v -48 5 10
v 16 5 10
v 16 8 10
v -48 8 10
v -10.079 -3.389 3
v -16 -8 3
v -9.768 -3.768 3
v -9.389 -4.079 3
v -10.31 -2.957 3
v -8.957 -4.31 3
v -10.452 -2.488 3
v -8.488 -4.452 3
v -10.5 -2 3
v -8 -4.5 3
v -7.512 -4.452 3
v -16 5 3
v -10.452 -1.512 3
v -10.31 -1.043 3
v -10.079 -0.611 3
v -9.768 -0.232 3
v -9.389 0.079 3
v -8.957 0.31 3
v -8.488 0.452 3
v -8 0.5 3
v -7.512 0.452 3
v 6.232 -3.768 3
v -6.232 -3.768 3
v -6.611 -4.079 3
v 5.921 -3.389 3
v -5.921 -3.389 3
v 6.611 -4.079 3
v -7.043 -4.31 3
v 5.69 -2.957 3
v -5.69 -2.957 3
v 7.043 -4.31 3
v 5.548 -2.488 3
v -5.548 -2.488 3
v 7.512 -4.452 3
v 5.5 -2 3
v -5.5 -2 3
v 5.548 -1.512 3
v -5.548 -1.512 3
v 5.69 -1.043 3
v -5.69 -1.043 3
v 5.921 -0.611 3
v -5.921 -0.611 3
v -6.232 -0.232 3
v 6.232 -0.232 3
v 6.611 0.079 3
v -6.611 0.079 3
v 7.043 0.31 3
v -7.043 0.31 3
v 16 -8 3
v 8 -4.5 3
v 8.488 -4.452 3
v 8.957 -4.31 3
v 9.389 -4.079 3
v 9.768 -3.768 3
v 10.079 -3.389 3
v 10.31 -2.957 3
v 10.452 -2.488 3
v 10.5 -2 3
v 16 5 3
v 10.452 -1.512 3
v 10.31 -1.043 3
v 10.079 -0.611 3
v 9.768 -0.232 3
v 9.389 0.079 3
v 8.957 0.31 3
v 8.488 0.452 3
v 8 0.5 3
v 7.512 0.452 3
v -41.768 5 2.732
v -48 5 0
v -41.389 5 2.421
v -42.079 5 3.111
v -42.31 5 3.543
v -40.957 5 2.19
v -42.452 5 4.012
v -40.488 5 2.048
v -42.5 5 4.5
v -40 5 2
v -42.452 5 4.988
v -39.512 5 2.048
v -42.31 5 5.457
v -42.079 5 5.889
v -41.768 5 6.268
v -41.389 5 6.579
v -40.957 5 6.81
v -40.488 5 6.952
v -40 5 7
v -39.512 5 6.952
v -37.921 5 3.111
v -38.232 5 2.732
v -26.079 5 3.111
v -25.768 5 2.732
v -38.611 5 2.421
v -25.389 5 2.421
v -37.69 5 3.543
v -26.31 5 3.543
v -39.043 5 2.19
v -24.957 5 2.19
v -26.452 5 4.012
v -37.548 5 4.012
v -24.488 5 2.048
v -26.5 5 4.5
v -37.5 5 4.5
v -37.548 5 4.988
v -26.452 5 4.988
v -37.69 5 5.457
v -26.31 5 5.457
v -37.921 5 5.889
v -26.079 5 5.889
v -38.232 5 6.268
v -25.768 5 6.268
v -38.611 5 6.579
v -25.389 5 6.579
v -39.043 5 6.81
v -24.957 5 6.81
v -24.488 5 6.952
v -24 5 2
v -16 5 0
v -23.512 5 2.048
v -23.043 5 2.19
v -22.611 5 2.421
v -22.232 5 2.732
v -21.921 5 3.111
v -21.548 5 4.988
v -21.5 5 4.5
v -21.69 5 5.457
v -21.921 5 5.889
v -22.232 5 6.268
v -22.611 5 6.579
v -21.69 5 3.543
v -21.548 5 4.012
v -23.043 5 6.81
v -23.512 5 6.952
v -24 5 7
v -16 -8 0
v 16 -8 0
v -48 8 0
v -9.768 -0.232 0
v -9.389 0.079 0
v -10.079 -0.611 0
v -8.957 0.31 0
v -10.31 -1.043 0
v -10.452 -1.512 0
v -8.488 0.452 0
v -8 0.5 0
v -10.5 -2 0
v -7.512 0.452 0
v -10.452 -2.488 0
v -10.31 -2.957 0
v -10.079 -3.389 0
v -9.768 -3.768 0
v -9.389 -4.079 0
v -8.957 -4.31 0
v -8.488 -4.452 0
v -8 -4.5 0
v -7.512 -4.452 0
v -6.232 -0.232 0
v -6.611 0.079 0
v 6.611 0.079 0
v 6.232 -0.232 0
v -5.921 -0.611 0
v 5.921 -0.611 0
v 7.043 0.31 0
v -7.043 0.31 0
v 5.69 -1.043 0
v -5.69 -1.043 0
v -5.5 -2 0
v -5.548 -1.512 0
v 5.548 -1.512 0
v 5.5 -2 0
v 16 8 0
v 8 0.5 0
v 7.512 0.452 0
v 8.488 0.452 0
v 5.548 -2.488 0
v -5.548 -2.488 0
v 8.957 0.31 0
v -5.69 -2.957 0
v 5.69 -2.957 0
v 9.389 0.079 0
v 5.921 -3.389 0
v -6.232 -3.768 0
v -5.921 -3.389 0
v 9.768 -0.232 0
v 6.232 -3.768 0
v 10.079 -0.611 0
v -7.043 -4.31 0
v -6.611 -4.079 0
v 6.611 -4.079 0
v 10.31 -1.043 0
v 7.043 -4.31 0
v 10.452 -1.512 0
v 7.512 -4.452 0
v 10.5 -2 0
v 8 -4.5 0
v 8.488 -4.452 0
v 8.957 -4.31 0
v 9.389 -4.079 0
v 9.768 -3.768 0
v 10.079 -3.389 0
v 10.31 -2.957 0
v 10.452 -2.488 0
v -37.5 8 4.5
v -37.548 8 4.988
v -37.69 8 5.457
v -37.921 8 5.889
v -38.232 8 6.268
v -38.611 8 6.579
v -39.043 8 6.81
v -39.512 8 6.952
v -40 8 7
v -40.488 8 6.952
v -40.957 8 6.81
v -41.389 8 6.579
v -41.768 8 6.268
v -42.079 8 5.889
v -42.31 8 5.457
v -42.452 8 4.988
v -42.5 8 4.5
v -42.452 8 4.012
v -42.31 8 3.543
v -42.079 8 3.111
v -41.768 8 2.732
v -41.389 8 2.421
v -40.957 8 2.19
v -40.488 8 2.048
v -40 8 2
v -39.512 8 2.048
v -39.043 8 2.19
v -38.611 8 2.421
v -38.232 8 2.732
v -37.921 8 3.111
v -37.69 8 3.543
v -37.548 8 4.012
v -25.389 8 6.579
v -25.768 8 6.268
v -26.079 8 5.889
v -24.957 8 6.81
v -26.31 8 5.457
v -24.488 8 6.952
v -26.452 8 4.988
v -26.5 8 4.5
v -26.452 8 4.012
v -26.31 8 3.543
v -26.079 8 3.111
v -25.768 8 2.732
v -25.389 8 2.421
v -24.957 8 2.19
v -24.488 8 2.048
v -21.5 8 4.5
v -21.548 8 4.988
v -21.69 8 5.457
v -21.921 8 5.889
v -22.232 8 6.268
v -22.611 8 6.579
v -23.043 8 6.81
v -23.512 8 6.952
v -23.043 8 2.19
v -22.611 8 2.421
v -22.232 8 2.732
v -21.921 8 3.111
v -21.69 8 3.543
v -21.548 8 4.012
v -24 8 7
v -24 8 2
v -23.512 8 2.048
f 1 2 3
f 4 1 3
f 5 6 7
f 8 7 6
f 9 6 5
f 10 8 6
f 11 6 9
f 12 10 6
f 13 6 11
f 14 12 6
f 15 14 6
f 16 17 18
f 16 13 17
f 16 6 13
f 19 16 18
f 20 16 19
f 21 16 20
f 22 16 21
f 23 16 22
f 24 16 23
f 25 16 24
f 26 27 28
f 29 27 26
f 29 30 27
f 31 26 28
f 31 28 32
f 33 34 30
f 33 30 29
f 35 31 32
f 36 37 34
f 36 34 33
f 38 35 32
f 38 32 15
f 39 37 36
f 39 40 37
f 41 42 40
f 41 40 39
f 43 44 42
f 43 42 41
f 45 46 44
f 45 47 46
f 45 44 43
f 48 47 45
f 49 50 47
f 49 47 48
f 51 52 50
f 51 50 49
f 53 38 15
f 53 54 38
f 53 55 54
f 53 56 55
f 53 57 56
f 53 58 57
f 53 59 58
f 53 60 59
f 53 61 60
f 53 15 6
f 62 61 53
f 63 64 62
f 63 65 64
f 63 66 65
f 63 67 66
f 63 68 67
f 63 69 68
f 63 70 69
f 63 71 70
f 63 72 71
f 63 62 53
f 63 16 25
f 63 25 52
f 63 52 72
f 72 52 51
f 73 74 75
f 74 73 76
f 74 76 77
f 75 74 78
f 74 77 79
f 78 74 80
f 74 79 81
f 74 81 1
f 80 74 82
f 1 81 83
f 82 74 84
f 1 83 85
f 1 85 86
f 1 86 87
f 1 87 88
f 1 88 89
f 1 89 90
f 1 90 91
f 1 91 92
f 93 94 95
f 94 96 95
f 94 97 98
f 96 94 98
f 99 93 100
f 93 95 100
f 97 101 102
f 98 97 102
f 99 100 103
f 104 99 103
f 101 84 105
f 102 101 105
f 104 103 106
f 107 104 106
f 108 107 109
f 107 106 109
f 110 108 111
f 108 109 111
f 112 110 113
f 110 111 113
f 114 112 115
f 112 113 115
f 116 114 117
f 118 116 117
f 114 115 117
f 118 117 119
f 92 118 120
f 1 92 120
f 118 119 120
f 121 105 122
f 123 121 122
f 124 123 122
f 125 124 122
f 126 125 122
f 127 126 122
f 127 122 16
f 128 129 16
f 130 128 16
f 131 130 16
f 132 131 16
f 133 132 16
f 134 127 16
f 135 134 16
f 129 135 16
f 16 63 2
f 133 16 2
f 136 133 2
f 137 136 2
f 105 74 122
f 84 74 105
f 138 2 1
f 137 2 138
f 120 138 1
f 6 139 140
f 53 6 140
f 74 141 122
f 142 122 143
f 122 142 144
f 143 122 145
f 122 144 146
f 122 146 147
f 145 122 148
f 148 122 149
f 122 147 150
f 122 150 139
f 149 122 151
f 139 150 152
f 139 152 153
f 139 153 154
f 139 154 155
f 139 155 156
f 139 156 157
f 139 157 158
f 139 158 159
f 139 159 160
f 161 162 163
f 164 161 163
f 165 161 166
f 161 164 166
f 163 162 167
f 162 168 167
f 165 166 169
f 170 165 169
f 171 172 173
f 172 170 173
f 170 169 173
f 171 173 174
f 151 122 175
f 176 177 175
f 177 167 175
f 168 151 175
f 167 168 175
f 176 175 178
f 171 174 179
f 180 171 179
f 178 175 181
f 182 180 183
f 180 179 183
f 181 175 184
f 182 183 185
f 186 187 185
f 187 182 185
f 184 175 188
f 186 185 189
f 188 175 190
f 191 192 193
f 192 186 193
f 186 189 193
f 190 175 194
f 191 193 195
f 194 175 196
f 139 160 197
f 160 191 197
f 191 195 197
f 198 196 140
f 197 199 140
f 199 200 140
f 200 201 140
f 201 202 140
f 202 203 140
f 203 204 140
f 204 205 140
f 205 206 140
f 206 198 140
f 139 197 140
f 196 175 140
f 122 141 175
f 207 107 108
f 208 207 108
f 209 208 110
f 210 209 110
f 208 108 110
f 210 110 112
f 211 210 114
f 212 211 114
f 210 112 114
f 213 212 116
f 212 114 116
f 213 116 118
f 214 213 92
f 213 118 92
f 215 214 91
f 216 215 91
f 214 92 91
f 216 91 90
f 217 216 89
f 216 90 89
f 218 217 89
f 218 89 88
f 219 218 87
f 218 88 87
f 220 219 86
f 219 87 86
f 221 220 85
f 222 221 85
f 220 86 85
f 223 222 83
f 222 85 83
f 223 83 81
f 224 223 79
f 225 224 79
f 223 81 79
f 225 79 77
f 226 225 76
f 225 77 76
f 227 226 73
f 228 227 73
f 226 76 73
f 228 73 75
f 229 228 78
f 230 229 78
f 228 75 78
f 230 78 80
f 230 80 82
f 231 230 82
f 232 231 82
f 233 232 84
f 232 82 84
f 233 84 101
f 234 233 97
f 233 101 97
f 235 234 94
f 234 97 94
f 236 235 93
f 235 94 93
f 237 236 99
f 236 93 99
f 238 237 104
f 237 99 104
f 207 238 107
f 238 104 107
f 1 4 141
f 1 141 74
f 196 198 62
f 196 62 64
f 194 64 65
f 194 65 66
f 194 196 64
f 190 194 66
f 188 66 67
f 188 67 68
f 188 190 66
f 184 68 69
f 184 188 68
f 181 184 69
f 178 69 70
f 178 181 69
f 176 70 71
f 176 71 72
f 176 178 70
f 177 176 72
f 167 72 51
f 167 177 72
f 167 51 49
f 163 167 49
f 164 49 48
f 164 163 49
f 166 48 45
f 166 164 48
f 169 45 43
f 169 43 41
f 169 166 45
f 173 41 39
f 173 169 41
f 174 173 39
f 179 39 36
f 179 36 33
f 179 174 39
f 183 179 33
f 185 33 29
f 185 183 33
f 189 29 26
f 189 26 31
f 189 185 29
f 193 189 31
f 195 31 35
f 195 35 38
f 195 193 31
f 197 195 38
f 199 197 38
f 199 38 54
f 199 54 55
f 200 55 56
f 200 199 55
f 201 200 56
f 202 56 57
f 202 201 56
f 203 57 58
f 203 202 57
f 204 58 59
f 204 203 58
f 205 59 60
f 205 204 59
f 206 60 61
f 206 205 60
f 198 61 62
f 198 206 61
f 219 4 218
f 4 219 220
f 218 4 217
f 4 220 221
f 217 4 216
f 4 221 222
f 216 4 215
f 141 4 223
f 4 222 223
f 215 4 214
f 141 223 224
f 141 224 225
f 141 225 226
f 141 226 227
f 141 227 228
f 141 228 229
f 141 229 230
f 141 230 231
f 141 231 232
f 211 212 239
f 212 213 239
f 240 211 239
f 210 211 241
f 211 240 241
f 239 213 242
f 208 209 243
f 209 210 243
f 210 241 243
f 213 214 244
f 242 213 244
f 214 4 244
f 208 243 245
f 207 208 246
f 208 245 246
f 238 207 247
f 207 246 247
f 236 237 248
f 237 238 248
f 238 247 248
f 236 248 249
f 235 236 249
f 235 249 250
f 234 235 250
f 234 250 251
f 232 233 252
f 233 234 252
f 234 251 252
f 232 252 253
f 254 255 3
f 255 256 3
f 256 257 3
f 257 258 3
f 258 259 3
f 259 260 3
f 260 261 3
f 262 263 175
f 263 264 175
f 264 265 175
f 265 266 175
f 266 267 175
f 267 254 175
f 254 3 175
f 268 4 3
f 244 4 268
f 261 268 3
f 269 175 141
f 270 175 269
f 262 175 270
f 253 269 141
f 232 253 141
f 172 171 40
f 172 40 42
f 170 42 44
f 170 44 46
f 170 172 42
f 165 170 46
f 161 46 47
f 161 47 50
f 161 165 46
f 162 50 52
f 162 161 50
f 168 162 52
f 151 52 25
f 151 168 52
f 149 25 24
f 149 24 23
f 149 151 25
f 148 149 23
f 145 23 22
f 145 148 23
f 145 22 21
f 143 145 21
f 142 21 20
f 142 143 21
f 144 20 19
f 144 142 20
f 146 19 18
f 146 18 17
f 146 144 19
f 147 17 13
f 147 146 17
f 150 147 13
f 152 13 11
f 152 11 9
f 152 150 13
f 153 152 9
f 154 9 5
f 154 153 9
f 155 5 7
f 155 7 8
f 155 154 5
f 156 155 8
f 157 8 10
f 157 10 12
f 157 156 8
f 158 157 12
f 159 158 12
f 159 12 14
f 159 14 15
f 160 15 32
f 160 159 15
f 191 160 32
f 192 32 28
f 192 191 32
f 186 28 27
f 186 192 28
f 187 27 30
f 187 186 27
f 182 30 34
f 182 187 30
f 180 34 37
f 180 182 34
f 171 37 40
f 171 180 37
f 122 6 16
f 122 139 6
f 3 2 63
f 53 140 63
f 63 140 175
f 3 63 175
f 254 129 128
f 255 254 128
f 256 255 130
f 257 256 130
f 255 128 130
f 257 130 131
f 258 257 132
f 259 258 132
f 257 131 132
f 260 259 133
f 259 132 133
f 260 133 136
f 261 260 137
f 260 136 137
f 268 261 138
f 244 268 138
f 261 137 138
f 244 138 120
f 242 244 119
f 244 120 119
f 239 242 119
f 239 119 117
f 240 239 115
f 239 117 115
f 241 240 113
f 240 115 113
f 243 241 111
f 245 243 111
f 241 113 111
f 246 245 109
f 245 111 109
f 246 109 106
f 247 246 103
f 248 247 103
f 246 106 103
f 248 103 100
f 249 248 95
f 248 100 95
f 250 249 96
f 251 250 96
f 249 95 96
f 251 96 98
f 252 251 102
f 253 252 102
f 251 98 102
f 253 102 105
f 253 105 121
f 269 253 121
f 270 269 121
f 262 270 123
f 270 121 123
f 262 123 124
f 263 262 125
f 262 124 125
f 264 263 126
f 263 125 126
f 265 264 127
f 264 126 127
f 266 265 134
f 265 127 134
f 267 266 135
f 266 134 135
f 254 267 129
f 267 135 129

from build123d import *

# Parameters (mm, degrees)
F0_W     = 32
F0_H     = 16
F0_R     = 2.5
F1_DEPTH = 3
F2_W     = 32
F2_H     = 3
F3_DEPTH = 7
F5_DEPTH = 32
F6_R     = 2.5
F7_DEPTH = 3


with BuildPart() as f1:
    # F0 (on Top) → F1 (new body)
    with BuildSketch(Plane.XY):
        Rectangle(F0_W, F0_H)
        with Locations((-8, -2)):
            Circle(F0_R, mode=Mode.SUBTRACT)
        with Locations((8, -2)):
            Circle(F0_R, mode=Mode.SUBTRACT)
    extrude(amount=F1_DEPTH)

    # F2 (on face) → F3 (join)
    with BuildSketch(Plane.XY.offset(3)):
        with Locations((0, 6.5)):
            Rectangle(F2_W, F2_H)
    extrude(amount=F3_DEPTH)

    # F4 (on face) → F5 (join)
    with BuildSketch(Plane(origin=(-16, 0, 0), x_dir=(0, -1, 0), z_dir=(-1, 0, 0))):
        Polygon((-8, 10), (-8, 0), (-5, 0), (-5, 3), (-5, 10), align=None)
    extrude(amount=F5_DEPTH)

    # F6 (on face) → F7 (cut)
    with BuildSketch(Plane.XZ.offset(-5)):
        with Locations((-40, 4.5)):
            Circle(F6_R)
        with Locations((-24, 4.5)):
            Circle(F6_R)
    extrude(amount=-F7_DEPTH, mode=Mode.SUBTRACT)


solid = f1.part
